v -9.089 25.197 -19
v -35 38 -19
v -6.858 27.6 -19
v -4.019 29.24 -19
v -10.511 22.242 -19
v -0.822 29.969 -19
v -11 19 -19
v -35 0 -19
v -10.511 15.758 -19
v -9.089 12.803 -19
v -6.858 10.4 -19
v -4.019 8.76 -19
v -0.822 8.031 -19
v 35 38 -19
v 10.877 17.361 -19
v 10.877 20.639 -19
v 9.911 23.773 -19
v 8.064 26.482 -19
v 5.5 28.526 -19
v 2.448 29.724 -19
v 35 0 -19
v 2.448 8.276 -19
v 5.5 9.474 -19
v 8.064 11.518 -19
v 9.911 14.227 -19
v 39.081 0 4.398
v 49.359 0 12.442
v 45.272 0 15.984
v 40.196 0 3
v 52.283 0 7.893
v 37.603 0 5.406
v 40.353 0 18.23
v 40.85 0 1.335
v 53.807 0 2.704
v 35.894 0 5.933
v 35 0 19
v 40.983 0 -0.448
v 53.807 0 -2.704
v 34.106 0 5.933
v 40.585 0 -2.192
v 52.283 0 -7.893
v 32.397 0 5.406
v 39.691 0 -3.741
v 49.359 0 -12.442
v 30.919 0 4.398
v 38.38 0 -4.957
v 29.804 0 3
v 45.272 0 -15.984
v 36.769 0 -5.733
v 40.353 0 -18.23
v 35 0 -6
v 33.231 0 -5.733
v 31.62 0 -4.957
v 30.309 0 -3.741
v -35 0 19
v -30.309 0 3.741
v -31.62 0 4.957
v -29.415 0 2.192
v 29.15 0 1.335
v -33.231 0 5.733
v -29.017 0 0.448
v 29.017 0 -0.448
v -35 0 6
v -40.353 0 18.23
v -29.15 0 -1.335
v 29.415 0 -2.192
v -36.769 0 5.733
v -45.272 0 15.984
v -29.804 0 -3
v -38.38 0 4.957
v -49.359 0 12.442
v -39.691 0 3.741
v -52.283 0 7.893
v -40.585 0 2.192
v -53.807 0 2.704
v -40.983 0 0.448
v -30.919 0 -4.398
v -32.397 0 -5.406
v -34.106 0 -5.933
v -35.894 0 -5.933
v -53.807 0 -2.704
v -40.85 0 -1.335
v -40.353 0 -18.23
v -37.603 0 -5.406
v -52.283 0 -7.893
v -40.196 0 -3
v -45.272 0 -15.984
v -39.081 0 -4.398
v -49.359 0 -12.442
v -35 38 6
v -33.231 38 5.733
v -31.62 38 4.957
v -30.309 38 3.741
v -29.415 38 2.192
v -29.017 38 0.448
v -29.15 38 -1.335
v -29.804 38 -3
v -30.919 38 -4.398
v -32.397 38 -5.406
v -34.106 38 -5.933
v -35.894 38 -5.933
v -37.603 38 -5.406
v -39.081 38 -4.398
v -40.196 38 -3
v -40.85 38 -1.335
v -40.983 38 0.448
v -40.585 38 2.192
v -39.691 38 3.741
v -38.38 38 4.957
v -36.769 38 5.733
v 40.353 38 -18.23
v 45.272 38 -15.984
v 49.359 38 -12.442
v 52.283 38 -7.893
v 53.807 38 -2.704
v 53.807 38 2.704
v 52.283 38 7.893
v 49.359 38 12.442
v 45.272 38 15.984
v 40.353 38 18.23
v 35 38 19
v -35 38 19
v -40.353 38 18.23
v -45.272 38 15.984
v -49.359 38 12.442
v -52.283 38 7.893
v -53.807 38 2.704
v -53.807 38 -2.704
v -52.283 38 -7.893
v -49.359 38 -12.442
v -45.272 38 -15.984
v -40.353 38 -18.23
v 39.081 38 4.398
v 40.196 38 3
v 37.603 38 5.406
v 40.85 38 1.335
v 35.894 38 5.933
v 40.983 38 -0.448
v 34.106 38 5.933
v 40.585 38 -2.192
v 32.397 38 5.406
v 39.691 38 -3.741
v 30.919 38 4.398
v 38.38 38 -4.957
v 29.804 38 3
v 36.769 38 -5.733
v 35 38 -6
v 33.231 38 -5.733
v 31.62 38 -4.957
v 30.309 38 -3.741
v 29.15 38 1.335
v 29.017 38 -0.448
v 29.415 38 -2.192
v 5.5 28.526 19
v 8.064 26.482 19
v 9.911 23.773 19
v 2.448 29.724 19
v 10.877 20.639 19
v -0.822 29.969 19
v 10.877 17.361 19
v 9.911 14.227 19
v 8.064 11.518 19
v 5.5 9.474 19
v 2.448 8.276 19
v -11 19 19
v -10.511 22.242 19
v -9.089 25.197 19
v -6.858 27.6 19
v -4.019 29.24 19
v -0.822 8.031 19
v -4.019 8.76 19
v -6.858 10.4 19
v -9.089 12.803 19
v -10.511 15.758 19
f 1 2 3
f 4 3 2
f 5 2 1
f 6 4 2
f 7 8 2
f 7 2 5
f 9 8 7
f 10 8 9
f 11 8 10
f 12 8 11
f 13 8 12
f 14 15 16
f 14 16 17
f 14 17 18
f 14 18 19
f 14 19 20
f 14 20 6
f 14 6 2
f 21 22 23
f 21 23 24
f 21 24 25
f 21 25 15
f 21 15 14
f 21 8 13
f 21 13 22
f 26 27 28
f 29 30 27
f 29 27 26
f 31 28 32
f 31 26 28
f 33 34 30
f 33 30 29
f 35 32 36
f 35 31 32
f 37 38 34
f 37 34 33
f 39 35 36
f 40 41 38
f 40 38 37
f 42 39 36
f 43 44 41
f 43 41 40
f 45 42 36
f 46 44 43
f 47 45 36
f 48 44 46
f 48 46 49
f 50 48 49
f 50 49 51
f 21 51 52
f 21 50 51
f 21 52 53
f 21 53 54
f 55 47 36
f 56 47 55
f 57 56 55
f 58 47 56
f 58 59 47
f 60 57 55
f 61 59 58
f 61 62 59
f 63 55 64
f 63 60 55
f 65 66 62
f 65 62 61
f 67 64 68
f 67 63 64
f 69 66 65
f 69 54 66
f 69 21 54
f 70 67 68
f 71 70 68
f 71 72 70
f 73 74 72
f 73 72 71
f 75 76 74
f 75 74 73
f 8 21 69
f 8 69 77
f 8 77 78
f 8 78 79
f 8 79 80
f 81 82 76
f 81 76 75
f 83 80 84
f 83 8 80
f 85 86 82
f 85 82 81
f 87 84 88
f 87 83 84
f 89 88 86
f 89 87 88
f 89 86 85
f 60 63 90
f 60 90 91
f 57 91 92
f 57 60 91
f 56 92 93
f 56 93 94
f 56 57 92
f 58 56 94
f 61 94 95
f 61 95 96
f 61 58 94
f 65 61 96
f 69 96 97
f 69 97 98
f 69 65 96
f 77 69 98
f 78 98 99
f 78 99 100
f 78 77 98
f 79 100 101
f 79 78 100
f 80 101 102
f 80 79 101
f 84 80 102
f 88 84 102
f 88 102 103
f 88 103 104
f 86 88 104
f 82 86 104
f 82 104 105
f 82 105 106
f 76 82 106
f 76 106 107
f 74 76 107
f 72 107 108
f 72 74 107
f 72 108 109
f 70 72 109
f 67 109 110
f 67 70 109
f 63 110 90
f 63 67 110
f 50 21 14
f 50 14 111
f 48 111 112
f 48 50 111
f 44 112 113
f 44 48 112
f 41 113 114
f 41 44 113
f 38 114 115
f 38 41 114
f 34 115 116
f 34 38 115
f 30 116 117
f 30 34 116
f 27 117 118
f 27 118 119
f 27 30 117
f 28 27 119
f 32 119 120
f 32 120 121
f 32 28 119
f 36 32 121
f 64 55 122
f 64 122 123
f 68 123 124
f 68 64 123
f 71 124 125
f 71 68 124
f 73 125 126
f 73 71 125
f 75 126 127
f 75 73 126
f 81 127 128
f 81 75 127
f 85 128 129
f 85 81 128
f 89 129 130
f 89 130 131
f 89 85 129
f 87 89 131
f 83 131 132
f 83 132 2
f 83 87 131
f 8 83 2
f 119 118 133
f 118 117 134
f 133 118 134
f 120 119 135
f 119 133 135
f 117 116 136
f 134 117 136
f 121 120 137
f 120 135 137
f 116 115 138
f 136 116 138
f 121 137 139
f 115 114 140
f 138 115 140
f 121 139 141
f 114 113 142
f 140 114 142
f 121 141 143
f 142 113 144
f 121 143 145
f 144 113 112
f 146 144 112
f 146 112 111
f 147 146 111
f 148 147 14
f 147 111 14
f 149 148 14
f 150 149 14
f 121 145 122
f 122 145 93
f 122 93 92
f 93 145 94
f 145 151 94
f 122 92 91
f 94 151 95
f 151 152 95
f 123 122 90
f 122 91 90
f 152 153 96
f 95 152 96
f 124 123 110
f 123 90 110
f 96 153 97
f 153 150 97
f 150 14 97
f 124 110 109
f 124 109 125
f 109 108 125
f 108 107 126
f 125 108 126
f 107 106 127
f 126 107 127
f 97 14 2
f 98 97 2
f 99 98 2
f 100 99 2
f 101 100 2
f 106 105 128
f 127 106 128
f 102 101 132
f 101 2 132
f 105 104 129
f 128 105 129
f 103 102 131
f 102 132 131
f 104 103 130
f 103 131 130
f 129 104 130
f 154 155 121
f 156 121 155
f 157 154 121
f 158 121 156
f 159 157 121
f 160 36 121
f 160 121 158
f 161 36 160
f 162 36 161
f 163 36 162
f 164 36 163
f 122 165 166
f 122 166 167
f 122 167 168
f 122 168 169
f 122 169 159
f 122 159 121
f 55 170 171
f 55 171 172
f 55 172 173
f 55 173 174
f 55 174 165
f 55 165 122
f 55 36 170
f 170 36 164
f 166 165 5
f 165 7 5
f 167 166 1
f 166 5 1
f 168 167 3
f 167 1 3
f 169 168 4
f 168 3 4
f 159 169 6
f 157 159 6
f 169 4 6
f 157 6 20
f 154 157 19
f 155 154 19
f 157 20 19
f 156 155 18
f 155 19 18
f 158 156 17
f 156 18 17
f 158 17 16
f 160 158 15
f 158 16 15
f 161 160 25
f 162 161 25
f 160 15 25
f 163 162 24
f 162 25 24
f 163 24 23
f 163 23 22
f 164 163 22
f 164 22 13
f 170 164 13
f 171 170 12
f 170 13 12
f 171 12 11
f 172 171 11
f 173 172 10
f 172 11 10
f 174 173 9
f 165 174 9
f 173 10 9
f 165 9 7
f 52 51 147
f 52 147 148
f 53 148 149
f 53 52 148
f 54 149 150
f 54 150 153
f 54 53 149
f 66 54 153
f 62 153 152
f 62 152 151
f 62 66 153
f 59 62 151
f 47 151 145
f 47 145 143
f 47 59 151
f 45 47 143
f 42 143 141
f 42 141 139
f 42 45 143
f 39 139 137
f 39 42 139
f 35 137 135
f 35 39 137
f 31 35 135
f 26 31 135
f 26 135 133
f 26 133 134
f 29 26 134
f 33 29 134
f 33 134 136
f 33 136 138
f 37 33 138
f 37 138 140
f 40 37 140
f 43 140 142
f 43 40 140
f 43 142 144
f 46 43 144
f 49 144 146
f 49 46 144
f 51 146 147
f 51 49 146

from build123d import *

# Parameters (mm, degrees)
SKETCH2_R                  = 6
BOSS_EXTRUDE1_DEPTH        = 38
M24X2_0_TAPPED_HOLE1_D     = 22
M24X2_0_TAPPED_HOLE1_DEPTH = 38
M24X2_0_TAPPED_HOLE1_TIP   = 6.609466809


with BuildPart() as part:
    # Sketch2 → Boss-Extrude1 (new body)
    with BuildSketch(Plane(origin=(0, 0, 0), x_dir=(1, 0, 0), z_dir=(0, 1, 0))):
        with BuildLine():
            Line((-35, 19), (35, 19))
            ThreePointArc((35, 19), (54, 0), (35, -19))
            Line((35, -19), (-35, -19))
            ThreePointArc((-35, -19), (-54, 0), (-35, 19))
        make_face()
        with Locations(Location((-35, 0, 0), (0, 0, 270))):
            Circle(SKETCH2_R, mode=Mode.SUBTRACT)
        with Locations(Location((35, 0, 0), (0, 0, 90))):
            Circle(SKETCH2_R, mode=Mode.SUBTRACT)
    extrude(amount=BOSS_EXTRUDE1_DEPTH)

    # M24x2.0 Tapped Hole1
    with Locations(Plane.XY.offset(19)):
        with Locations((0, 19)):
            Hole(M24X2_0_TAPPED_HOLE1_D / 2, depth=M24X2_0_TAPPED_HOLE1_DEPTH)
            with Locations((0, 0, -(M24X2_0_TAPPED_HOLE1_DEPTH + M24X2_0_TAPPED_HOLE1_TIP / 2))):  # 118° drill point
                Cone(0, M24X2_0_TAPPED_HOLE1_D / 2, M24X2_0_TAPPED_HOLE1_TIP, mode=Mode.SUBTRACT)


solid = part.part
